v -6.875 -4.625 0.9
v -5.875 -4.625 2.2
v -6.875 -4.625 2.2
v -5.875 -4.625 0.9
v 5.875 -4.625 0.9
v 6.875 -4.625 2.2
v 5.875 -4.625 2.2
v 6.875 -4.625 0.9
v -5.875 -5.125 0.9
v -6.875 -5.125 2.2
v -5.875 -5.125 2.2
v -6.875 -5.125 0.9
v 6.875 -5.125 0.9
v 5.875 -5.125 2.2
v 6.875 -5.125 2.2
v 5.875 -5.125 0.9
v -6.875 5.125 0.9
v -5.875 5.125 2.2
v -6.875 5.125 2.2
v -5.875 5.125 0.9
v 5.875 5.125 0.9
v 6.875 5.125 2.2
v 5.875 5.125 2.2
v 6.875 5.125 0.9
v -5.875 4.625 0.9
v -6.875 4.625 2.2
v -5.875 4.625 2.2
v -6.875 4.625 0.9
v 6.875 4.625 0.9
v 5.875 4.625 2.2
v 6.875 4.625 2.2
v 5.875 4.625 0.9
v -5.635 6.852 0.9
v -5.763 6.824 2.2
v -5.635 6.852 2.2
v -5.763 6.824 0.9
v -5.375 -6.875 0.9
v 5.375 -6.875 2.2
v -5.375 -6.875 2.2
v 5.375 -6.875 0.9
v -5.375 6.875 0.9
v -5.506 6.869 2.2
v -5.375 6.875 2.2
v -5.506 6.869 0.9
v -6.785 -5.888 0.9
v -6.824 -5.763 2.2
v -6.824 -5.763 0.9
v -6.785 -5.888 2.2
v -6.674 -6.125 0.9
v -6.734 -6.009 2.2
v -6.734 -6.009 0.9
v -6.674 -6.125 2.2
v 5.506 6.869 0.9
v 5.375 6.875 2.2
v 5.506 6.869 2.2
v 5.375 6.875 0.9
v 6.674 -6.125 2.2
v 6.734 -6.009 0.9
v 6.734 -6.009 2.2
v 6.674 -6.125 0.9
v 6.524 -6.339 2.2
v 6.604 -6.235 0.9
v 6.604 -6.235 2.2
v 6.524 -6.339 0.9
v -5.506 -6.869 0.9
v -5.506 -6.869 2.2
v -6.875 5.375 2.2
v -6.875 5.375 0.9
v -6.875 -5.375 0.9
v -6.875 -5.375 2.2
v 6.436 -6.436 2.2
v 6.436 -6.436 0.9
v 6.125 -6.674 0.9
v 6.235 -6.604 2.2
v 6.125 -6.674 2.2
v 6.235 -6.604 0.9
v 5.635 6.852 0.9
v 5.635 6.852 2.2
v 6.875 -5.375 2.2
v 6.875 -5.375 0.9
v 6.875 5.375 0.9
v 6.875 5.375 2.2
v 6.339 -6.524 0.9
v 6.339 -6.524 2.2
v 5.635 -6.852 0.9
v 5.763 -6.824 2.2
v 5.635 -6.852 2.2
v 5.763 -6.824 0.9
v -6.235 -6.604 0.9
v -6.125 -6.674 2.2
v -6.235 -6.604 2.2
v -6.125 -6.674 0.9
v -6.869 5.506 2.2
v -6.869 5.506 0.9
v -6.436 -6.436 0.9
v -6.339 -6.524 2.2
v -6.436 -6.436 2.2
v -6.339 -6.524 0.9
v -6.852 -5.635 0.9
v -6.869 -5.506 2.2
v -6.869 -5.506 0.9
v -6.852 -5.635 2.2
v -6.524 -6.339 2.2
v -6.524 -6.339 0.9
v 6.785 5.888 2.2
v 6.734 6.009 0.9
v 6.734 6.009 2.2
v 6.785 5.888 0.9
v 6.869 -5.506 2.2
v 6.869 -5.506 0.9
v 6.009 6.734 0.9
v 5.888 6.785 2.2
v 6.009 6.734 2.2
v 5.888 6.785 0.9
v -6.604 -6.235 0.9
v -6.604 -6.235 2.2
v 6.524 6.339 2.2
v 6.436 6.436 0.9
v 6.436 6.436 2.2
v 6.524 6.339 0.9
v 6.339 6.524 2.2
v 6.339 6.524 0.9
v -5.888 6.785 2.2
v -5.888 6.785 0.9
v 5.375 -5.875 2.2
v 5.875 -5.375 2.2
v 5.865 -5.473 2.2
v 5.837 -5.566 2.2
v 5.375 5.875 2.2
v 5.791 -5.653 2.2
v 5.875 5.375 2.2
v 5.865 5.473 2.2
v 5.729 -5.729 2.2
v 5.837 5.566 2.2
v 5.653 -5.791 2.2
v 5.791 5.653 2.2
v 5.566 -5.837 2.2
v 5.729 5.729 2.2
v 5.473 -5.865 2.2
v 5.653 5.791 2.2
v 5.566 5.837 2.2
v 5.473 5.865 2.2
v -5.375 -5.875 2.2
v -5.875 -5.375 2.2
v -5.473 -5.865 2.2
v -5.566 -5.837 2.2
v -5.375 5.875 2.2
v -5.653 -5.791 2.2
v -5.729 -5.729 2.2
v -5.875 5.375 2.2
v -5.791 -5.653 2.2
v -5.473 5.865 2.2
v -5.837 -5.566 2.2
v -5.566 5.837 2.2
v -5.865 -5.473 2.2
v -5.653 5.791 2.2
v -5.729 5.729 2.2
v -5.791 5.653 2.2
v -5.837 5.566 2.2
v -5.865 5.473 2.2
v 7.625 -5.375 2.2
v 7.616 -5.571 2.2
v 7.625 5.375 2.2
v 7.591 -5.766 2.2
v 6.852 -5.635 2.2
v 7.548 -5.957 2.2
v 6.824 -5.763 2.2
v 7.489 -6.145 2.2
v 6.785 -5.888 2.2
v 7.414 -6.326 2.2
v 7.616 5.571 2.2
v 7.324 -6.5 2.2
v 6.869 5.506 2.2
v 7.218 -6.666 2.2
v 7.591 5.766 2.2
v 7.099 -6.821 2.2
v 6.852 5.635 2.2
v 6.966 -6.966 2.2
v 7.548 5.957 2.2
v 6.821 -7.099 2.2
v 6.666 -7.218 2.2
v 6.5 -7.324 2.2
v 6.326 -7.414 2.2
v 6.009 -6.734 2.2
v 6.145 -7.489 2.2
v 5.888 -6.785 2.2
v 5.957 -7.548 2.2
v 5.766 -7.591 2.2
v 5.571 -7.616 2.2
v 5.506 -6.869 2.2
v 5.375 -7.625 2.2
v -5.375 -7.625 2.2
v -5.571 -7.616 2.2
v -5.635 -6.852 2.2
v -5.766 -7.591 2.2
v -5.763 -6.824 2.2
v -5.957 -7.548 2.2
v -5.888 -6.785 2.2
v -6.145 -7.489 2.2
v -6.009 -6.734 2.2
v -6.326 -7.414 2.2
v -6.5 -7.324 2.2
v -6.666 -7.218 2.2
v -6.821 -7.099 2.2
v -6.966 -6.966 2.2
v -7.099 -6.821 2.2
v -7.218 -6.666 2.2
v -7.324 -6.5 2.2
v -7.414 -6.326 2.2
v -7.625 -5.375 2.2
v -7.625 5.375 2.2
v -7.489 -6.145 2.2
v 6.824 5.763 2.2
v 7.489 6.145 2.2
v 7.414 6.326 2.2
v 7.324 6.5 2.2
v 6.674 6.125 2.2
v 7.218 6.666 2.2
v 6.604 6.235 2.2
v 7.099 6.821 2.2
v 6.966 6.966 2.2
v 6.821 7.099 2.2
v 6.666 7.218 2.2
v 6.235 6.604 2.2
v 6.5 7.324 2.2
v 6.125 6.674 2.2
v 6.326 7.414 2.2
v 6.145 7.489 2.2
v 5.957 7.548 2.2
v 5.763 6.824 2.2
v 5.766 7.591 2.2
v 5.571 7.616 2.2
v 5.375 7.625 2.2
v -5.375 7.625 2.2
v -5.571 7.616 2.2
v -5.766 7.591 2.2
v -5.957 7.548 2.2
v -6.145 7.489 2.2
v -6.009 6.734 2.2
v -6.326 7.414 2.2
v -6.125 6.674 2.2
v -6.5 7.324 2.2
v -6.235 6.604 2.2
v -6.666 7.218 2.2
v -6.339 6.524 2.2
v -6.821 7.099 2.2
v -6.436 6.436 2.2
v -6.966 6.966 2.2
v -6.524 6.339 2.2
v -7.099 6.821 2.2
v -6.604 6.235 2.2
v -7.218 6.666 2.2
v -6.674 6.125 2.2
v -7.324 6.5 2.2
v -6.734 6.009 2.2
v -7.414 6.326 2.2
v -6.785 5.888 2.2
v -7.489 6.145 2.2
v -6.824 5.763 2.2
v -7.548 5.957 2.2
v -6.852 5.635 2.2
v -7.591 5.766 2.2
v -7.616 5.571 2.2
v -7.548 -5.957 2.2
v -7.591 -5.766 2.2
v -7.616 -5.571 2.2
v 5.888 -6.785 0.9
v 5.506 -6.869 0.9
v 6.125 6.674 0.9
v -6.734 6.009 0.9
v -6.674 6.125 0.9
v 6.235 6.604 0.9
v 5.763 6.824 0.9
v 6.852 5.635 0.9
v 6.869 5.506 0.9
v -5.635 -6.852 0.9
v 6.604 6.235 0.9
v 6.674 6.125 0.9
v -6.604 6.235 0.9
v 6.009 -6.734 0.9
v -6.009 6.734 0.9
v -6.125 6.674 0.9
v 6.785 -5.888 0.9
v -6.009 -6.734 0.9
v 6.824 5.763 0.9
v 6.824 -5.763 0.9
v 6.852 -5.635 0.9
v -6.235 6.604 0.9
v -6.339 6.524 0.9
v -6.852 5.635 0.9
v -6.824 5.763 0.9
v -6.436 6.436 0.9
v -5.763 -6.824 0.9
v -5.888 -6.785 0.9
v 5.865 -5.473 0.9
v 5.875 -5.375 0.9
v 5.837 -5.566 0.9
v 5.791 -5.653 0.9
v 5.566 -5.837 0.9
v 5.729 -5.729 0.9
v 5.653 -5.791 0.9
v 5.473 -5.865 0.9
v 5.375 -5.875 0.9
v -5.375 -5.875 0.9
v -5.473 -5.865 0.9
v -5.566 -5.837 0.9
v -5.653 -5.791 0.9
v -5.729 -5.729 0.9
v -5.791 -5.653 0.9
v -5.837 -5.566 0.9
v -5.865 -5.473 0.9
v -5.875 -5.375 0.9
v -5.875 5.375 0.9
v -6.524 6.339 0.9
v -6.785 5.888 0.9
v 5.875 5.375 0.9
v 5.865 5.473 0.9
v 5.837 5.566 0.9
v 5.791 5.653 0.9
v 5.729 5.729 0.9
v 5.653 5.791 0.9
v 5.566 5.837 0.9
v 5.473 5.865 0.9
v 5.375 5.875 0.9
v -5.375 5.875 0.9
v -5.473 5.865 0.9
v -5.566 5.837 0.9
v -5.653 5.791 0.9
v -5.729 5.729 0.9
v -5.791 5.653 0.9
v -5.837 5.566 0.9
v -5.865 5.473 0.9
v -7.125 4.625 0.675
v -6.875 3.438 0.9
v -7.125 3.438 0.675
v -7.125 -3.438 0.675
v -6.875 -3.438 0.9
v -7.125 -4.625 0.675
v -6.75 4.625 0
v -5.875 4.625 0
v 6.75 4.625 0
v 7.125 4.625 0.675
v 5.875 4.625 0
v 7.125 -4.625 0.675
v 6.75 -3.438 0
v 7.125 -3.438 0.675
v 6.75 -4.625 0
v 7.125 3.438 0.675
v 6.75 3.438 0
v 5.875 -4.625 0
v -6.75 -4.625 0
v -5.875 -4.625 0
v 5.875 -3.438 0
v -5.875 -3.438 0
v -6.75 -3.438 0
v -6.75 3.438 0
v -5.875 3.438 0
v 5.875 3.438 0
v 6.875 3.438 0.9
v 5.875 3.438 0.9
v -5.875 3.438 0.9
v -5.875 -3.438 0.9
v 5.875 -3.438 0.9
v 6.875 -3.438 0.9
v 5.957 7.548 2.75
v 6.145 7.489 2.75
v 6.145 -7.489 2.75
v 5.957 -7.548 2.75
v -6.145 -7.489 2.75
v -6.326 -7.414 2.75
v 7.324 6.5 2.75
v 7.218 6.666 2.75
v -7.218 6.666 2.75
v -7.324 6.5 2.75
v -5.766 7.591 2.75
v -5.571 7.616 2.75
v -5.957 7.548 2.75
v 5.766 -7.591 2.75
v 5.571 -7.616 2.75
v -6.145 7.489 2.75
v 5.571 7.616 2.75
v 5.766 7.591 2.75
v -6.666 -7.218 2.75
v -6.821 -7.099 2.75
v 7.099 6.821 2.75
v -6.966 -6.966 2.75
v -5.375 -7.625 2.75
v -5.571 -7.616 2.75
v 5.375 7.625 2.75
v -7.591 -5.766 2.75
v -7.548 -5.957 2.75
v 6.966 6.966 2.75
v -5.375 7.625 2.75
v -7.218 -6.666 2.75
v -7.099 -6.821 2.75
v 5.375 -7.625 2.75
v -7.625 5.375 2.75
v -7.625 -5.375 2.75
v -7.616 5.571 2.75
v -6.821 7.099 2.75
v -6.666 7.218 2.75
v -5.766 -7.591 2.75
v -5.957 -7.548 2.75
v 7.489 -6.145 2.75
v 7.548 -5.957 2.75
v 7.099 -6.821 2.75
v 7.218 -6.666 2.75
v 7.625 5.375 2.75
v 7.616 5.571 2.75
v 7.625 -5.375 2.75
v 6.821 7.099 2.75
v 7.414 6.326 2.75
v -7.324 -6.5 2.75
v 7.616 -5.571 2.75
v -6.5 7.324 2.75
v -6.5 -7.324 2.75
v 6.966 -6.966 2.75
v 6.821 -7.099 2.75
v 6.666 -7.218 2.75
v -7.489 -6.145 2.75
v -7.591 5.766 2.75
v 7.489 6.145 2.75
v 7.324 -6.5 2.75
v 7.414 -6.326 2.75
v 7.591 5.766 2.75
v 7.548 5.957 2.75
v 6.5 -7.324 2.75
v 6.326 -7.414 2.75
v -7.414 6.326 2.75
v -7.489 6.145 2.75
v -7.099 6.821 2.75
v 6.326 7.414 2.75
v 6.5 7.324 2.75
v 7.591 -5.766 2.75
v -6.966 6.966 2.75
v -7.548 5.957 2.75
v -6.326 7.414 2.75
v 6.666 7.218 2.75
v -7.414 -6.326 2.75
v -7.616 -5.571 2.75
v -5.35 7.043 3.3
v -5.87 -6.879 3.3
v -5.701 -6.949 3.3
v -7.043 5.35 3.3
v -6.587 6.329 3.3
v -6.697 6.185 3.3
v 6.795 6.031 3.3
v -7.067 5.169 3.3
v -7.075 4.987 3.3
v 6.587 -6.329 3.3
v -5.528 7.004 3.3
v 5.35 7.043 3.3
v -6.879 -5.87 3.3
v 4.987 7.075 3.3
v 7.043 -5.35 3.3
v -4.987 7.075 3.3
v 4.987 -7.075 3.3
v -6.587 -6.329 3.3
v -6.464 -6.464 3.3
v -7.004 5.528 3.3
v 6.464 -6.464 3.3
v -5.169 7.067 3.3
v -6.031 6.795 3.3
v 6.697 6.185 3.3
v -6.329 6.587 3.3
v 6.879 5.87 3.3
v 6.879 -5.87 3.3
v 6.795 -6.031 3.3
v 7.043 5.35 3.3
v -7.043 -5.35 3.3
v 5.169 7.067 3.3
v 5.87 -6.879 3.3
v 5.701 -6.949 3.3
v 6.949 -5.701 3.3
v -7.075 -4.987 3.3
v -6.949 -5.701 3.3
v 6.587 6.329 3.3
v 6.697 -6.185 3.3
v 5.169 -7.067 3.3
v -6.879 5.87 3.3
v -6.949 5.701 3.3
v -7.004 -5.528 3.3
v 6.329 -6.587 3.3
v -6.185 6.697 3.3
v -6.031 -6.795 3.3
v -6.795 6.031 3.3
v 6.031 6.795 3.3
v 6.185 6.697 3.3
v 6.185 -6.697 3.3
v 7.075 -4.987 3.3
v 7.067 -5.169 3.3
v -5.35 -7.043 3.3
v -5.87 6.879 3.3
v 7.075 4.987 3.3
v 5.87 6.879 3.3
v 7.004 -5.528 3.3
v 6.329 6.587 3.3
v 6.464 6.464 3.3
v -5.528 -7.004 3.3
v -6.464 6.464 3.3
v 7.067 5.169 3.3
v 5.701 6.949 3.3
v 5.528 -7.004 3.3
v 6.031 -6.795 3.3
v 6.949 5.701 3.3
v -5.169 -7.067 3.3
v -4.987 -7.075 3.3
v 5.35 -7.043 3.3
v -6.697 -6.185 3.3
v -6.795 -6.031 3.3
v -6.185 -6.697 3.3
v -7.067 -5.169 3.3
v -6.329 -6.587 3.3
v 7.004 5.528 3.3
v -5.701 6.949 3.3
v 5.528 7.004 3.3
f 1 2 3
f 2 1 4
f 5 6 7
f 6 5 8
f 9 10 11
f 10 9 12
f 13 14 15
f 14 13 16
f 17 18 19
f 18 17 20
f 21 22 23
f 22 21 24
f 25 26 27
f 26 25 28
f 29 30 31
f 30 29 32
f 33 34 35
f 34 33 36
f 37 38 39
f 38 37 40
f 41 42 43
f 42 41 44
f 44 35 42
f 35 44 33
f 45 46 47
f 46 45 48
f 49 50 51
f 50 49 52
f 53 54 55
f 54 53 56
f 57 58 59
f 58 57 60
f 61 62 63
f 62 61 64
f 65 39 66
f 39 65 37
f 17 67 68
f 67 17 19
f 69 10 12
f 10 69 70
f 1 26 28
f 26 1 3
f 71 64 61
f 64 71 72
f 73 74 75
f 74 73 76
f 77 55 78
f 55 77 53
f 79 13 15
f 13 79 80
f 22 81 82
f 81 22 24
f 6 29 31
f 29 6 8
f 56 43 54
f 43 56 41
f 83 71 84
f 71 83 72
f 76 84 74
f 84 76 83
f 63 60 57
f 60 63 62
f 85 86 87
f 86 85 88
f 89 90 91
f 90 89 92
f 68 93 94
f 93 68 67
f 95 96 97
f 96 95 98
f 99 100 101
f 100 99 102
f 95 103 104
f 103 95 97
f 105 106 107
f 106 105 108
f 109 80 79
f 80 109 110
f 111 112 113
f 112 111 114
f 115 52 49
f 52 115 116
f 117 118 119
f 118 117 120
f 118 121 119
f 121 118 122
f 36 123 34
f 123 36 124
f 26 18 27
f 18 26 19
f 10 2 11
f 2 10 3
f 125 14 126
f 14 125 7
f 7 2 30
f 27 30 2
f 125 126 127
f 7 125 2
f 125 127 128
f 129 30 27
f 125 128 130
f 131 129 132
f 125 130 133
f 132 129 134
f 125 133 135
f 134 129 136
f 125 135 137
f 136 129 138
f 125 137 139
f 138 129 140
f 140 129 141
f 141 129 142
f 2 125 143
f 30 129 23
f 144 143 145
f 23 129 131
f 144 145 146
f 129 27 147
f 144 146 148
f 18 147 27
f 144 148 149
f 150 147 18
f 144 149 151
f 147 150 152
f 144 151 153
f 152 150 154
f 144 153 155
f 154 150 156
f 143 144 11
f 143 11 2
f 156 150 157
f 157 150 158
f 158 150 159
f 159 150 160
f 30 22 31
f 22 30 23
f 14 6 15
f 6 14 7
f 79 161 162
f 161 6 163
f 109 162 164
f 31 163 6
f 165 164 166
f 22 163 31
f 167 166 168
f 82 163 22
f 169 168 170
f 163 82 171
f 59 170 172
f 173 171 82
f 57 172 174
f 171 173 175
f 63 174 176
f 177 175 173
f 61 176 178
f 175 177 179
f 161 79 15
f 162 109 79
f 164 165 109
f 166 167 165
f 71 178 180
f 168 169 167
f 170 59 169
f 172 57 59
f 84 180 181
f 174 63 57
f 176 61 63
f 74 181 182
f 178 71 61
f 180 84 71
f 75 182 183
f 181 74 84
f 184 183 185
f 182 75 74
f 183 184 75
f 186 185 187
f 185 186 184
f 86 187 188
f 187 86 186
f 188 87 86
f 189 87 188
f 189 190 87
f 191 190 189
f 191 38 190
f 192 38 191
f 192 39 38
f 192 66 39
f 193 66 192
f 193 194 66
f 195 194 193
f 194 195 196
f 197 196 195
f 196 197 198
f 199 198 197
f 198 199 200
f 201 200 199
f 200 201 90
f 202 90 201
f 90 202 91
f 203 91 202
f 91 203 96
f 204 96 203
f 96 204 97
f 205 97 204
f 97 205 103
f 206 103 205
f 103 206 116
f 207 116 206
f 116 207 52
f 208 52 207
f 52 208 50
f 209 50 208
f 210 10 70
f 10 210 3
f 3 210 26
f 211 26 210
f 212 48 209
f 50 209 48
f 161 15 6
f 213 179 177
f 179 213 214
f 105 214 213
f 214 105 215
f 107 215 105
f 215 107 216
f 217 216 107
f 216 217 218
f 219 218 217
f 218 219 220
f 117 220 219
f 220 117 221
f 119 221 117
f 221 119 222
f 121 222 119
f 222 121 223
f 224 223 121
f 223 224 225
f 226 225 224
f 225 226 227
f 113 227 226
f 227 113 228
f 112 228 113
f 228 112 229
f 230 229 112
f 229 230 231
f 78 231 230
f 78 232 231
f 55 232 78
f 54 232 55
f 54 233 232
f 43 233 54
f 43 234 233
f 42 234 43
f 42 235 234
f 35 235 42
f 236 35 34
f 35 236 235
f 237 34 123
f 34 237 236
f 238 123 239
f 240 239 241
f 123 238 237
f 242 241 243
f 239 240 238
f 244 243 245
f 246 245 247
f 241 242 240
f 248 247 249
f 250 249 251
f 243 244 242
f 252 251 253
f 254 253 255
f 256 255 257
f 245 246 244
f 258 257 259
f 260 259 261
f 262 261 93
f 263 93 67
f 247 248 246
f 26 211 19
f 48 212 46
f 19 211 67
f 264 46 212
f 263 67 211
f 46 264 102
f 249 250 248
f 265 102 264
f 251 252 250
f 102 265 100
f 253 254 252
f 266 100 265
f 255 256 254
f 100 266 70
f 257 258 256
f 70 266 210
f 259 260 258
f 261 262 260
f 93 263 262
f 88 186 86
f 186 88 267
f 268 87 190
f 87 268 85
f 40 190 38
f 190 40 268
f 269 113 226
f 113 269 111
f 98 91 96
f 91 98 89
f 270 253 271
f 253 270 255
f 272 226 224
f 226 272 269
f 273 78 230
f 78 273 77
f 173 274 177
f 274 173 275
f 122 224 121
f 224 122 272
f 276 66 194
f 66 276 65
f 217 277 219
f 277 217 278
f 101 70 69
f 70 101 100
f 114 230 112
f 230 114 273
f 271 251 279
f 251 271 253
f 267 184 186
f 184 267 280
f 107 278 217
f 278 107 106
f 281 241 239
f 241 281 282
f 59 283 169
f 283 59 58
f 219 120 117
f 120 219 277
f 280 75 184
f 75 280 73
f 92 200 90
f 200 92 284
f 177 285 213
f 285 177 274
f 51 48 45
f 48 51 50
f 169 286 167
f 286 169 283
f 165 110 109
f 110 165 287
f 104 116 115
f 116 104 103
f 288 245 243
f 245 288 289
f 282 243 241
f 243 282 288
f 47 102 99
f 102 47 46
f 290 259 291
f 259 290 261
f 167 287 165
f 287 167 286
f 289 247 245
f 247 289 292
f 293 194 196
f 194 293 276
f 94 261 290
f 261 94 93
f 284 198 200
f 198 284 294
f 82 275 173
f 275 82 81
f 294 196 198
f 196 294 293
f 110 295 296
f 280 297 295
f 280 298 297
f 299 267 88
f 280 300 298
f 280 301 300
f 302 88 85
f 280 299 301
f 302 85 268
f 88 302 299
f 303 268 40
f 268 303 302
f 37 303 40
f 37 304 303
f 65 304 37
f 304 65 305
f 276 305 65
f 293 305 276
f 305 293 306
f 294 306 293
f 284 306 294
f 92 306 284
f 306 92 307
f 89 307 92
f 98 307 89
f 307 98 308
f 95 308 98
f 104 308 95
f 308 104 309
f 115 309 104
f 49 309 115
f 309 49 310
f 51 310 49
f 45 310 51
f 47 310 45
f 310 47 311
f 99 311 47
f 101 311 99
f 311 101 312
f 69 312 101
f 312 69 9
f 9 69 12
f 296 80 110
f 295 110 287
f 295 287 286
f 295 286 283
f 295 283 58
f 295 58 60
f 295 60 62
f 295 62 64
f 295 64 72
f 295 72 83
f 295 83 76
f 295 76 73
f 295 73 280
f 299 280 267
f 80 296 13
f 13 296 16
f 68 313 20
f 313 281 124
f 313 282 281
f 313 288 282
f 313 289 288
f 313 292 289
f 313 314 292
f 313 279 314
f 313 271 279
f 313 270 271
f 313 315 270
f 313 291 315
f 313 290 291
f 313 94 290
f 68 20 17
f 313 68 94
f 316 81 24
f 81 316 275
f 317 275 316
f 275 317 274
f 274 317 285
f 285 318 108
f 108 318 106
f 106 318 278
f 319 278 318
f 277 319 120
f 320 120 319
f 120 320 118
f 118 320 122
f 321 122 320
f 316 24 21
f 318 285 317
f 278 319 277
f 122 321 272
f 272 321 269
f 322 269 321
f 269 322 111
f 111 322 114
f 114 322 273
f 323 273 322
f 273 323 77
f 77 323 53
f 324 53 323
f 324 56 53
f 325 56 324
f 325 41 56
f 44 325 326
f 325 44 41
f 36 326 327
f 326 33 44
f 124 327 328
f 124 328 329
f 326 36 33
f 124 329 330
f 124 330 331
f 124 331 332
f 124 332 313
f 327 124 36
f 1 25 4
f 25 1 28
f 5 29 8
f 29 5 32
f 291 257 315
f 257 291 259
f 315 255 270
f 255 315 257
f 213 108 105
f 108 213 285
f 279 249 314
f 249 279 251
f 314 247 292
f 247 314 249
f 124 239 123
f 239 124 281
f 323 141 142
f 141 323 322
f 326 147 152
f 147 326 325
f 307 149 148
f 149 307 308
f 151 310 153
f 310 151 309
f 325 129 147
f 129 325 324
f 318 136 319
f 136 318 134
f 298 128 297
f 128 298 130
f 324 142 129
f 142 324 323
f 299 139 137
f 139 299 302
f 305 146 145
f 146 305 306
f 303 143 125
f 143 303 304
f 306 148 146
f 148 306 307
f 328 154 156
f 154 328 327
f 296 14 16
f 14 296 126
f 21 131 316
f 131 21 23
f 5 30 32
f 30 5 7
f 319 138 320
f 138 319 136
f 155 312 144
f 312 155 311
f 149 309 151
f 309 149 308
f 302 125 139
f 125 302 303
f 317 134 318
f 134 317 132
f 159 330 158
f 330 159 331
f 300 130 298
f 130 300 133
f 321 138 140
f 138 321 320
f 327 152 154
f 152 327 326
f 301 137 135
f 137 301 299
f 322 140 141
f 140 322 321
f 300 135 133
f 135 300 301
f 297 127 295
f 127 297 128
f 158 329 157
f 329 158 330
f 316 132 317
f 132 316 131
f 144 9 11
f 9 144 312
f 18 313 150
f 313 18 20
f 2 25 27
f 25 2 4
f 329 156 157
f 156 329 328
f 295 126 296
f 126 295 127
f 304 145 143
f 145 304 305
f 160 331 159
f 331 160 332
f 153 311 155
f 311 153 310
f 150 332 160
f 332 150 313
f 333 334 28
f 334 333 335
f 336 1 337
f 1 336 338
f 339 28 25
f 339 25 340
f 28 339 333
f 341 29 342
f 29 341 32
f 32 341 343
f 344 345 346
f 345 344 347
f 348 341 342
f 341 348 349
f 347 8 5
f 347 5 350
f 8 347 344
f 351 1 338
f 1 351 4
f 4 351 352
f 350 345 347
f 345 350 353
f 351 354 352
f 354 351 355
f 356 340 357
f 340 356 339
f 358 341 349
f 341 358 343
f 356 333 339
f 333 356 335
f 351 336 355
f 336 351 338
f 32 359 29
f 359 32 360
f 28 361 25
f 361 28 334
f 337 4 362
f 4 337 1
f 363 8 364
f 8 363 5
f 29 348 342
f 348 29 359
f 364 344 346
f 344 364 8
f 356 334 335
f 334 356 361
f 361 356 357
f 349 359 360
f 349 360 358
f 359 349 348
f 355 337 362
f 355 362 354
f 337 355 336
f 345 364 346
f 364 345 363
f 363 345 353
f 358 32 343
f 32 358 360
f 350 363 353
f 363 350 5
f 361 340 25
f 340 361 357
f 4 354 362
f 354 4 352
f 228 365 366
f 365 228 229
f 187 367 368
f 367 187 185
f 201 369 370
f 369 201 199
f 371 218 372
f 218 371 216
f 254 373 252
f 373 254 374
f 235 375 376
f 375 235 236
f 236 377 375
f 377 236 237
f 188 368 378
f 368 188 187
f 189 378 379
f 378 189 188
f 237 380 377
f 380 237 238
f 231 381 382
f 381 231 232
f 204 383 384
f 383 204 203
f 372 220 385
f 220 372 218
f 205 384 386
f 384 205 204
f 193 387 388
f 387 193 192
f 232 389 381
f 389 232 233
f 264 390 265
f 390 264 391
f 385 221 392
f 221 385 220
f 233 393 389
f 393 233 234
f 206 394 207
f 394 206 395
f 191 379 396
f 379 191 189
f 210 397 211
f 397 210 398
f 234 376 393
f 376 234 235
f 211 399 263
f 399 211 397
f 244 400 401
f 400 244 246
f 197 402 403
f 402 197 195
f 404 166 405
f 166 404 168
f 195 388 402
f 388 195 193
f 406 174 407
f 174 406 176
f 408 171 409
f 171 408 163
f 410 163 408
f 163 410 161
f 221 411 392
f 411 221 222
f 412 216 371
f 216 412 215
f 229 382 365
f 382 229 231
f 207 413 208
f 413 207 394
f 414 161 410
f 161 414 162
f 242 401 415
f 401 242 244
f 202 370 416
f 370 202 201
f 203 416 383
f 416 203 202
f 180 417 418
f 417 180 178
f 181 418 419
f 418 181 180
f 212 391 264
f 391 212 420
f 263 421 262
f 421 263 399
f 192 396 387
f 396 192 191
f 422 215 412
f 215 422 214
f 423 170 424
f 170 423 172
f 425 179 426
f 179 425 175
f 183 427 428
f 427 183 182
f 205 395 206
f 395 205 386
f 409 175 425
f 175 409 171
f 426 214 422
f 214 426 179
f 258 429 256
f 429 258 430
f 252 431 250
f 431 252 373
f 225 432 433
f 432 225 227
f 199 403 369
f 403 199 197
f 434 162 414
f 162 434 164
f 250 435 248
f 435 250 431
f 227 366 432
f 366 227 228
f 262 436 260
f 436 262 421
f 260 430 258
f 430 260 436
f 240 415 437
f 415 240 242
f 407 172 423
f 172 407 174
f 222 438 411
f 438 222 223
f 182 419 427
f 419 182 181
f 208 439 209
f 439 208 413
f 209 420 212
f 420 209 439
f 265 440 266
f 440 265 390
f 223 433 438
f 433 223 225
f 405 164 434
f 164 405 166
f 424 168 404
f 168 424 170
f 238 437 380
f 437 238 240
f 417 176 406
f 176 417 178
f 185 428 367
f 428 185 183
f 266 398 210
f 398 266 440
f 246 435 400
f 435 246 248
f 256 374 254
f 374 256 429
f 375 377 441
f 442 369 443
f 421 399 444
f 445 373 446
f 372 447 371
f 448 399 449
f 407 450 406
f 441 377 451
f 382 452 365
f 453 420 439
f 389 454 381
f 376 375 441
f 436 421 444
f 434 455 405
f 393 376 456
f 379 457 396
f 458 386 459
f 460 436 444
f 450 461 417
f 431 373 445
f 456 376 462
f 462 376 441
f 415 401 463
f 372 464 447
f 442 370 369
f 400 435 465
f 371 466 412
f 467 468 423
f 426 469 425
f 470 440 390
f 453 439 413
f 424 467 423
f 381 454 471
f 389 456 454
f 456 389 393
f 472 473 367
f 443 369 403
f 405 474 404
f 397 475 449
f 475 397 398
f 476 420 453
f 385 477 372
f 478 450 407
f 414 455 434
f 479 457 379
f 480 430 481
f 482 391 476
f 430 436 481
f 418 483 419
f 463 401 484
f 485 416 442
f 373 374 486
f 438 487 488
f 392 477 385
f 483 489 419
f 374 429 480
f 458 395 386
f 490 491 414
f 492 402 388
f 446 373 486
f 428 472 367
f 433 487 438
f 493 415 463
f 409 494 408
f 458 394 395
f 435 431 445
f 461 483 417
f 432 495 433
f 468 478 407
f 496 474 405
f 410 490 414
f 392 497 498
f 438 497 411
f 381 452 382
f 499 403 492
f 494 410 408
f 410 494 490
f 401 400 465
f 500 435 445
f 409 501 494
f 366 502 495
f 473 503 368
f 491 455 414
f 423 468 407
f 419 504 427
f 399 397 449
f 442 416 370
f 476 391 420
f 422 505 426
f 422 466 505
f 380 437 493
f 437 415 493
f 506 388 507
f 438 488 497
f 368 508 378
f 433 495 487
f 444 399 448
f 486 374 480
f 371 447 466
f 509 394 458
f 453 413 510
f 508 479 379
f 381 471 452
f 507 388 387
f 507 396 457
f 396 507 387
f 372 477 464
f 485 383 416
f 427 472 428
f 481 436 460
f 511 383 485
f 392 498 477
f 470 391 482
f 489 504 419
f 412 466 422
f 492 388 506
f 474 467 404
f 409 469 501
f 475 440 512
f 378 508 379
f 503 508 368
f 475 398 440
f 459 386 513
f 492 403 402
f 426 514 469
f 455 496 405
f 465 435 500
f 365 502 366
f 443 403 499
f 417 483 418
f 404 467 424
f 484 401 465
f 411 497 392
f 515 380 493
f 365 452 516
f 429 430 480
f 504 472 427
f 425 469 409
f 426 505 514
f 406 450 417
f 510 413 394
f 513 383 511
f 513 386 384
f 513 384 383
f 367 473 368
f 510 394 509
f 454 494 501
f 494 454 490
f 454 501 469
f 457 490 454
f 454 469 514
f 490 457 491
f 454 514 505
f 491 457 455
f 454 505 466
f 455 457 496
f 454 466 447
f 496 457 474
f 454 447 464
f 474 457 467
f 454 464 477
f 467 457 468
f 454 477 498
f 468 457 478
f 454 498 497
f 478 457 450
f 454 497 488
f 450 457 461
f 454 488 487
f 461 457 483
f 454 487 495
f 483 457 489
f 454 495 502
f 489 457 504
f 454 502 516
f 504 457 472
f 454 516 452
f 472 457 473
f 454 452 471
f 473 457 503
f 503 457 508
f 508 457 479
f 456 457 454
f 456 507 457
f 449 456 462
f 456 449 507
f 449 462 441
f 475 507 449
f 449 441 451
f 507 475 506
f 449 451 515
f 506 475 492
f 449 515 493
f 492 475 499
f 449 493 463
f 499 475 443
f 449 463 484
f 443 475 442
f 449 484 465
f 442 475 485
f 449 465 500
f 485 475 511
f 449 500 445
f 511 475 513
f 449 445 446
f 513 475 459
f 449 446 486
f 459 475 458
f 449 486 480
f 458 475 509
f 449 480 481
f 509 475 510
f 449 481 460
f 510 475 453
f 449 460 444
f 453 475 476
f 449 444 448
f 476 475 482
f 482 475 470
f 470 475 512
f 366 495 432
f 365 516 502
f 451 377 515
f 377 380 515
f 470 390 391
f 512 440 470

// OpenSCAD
use <../common.scad>


$fs = $preview ? 1 : 0.1;
$fa = $preview ? 10 : 5;


// Main switch housing size.
housing_size = 13.75;
// Switch housing corner radius.
housing_corner_radius = 1.5;


// Plate mount top.
plate_top = 2.2;
// Plate thickness to determine clip position.
plate_thickness = 1.3;
// Plate lip size.
plate_lip = 0.75;
// Plate lip thickness.
plate_lip_height = 1.1;
// Plate taper height.
plate_taper_height = plate_lip_height / 2;
// Plate lip taper.
plate_lip_taper = plate_lip_height / 2;
// If plate clips should be added.
plate_clips = true;
// Plate clip size.
plate_clip = 0.25;


// Spacing between blanks.
blank_spacing = plate_lip * 2 + 2;
// Blank count with sprues.
blank_count = [1, 1];
// Sprue size between blanks.
sprue_size = 1.2;


module blank() {
    clip_height = plate_top - plate_thickness;
    lip_size = housing_size + plate_lip * 2;
    translate([0, 0, plate_top + (plate_lip_height - plate_taper_height) * 0.5])
        rounded_cubeoid(
            [lip_size, lip_size, plate_taper_height],
            housing_corner_radius + plate_lip
        );
    translate([0, 0, plate_top + plate_taper_height * 0.5 + plate_lip_height - plate_taper_height])
        rounded_cubeoid(
            [lip_size, lip_size, plate_taper_height],
            housing_corner_radius + plate_lip,
            scale = (lip_size - plate_lip_taper * 2) / lip_size
        );
    difference() {
        translate([0, 0, clip_height + plate_thickness / 2])
            rounded_cubeoid([housing_size, housing_size, plate_thickness], housing_corner_radius);
        translate([0, 0, (plate_top) * 0.5])
            rounded_cubeoid([housing_size - 2, housing_size - 2, plate_top + 0.1], housing_corner_radius - 1);
        translate([0, 0, (plate_top) * 0.5]) {
            cutout_offset = (housing_size - housing_corner_radius * 3 + plate_clip + 0.25) / 2;
            translate([0, -cutout_offset, 0])
                cube([housing_size + 1, 0.5, plate_top + 0.1], center = true);
            translate([0, cutout_offset, 0])
                cube([housing_size + 1, 0.5, plate_top + 0.1], center = true);
        }
    }
    difference() {
        rotate([90, 0, 0])
            linear_extrude(housing_size - housing_corner_radius * 3, center = true)
            polygon([
                [housing_size * -0.5 + plate_clip * 0.5, 0],
                [housing_size * -0.5 - plate_clip, clip_height * 0.75],
                [housing_size * -0.5, clip_height],
                [housing_size * 0.5, clip_height],
                [housing_size * 0.5 + plate_clip, clip_height * 0.75],
                [housing_size * 0.5 - plate_clip * 0.5, 0]
            ]);
        translate([0, 0, clip_height * 0.5])
            cube([
                housing_size + plate_clip * 2 + 0.1,
                housing_size / 2,
                clip_height + 0.2
            ], center = true);
        translate([0, 0, clip_height * 0.5])
            cube([housing_size - 2, housing_size + 2, clip_height + 0.2], center = true);
    }
}


for (y = [0 : blank_count[1] - 1]) {
    for (x = [0 : blank_count[0] - 1]) {
        if (sprue_size > 0 && x > 0) {
            translate([
                (x - blank_count[0] / 2) * (housing_size + blank_spacing),
                (y - (blank_count[1] - 1) / 2) * (housing_size + blank_spacing),
                sprue_size / 2
            ]) cube([
                blank_spacing + housing_corner_radius * 2.5,
                sprue_size,
                sprue_size
            ], center = true);
            if (y > 0) {
            translate([
                (x - blank_count[0] / 2) * (housing_size + blank_spacing),
                (y - blank_count[1] / 2) * (housing_size + blank_spacing),
                sprue_size / 2
            ]) cube([sprue_size, housing_size + blank_spacing + 0.1, sprue_size], center = true);
            }
        }
        translate([
            (x - (blank_count[0] - 1) / 2) * (housing_size + blank_spacing),
            (y - (blank_count[1] - 1) / 2) * (housing_size + blank_spacing),
            0
        ]) blank();
    }
}
